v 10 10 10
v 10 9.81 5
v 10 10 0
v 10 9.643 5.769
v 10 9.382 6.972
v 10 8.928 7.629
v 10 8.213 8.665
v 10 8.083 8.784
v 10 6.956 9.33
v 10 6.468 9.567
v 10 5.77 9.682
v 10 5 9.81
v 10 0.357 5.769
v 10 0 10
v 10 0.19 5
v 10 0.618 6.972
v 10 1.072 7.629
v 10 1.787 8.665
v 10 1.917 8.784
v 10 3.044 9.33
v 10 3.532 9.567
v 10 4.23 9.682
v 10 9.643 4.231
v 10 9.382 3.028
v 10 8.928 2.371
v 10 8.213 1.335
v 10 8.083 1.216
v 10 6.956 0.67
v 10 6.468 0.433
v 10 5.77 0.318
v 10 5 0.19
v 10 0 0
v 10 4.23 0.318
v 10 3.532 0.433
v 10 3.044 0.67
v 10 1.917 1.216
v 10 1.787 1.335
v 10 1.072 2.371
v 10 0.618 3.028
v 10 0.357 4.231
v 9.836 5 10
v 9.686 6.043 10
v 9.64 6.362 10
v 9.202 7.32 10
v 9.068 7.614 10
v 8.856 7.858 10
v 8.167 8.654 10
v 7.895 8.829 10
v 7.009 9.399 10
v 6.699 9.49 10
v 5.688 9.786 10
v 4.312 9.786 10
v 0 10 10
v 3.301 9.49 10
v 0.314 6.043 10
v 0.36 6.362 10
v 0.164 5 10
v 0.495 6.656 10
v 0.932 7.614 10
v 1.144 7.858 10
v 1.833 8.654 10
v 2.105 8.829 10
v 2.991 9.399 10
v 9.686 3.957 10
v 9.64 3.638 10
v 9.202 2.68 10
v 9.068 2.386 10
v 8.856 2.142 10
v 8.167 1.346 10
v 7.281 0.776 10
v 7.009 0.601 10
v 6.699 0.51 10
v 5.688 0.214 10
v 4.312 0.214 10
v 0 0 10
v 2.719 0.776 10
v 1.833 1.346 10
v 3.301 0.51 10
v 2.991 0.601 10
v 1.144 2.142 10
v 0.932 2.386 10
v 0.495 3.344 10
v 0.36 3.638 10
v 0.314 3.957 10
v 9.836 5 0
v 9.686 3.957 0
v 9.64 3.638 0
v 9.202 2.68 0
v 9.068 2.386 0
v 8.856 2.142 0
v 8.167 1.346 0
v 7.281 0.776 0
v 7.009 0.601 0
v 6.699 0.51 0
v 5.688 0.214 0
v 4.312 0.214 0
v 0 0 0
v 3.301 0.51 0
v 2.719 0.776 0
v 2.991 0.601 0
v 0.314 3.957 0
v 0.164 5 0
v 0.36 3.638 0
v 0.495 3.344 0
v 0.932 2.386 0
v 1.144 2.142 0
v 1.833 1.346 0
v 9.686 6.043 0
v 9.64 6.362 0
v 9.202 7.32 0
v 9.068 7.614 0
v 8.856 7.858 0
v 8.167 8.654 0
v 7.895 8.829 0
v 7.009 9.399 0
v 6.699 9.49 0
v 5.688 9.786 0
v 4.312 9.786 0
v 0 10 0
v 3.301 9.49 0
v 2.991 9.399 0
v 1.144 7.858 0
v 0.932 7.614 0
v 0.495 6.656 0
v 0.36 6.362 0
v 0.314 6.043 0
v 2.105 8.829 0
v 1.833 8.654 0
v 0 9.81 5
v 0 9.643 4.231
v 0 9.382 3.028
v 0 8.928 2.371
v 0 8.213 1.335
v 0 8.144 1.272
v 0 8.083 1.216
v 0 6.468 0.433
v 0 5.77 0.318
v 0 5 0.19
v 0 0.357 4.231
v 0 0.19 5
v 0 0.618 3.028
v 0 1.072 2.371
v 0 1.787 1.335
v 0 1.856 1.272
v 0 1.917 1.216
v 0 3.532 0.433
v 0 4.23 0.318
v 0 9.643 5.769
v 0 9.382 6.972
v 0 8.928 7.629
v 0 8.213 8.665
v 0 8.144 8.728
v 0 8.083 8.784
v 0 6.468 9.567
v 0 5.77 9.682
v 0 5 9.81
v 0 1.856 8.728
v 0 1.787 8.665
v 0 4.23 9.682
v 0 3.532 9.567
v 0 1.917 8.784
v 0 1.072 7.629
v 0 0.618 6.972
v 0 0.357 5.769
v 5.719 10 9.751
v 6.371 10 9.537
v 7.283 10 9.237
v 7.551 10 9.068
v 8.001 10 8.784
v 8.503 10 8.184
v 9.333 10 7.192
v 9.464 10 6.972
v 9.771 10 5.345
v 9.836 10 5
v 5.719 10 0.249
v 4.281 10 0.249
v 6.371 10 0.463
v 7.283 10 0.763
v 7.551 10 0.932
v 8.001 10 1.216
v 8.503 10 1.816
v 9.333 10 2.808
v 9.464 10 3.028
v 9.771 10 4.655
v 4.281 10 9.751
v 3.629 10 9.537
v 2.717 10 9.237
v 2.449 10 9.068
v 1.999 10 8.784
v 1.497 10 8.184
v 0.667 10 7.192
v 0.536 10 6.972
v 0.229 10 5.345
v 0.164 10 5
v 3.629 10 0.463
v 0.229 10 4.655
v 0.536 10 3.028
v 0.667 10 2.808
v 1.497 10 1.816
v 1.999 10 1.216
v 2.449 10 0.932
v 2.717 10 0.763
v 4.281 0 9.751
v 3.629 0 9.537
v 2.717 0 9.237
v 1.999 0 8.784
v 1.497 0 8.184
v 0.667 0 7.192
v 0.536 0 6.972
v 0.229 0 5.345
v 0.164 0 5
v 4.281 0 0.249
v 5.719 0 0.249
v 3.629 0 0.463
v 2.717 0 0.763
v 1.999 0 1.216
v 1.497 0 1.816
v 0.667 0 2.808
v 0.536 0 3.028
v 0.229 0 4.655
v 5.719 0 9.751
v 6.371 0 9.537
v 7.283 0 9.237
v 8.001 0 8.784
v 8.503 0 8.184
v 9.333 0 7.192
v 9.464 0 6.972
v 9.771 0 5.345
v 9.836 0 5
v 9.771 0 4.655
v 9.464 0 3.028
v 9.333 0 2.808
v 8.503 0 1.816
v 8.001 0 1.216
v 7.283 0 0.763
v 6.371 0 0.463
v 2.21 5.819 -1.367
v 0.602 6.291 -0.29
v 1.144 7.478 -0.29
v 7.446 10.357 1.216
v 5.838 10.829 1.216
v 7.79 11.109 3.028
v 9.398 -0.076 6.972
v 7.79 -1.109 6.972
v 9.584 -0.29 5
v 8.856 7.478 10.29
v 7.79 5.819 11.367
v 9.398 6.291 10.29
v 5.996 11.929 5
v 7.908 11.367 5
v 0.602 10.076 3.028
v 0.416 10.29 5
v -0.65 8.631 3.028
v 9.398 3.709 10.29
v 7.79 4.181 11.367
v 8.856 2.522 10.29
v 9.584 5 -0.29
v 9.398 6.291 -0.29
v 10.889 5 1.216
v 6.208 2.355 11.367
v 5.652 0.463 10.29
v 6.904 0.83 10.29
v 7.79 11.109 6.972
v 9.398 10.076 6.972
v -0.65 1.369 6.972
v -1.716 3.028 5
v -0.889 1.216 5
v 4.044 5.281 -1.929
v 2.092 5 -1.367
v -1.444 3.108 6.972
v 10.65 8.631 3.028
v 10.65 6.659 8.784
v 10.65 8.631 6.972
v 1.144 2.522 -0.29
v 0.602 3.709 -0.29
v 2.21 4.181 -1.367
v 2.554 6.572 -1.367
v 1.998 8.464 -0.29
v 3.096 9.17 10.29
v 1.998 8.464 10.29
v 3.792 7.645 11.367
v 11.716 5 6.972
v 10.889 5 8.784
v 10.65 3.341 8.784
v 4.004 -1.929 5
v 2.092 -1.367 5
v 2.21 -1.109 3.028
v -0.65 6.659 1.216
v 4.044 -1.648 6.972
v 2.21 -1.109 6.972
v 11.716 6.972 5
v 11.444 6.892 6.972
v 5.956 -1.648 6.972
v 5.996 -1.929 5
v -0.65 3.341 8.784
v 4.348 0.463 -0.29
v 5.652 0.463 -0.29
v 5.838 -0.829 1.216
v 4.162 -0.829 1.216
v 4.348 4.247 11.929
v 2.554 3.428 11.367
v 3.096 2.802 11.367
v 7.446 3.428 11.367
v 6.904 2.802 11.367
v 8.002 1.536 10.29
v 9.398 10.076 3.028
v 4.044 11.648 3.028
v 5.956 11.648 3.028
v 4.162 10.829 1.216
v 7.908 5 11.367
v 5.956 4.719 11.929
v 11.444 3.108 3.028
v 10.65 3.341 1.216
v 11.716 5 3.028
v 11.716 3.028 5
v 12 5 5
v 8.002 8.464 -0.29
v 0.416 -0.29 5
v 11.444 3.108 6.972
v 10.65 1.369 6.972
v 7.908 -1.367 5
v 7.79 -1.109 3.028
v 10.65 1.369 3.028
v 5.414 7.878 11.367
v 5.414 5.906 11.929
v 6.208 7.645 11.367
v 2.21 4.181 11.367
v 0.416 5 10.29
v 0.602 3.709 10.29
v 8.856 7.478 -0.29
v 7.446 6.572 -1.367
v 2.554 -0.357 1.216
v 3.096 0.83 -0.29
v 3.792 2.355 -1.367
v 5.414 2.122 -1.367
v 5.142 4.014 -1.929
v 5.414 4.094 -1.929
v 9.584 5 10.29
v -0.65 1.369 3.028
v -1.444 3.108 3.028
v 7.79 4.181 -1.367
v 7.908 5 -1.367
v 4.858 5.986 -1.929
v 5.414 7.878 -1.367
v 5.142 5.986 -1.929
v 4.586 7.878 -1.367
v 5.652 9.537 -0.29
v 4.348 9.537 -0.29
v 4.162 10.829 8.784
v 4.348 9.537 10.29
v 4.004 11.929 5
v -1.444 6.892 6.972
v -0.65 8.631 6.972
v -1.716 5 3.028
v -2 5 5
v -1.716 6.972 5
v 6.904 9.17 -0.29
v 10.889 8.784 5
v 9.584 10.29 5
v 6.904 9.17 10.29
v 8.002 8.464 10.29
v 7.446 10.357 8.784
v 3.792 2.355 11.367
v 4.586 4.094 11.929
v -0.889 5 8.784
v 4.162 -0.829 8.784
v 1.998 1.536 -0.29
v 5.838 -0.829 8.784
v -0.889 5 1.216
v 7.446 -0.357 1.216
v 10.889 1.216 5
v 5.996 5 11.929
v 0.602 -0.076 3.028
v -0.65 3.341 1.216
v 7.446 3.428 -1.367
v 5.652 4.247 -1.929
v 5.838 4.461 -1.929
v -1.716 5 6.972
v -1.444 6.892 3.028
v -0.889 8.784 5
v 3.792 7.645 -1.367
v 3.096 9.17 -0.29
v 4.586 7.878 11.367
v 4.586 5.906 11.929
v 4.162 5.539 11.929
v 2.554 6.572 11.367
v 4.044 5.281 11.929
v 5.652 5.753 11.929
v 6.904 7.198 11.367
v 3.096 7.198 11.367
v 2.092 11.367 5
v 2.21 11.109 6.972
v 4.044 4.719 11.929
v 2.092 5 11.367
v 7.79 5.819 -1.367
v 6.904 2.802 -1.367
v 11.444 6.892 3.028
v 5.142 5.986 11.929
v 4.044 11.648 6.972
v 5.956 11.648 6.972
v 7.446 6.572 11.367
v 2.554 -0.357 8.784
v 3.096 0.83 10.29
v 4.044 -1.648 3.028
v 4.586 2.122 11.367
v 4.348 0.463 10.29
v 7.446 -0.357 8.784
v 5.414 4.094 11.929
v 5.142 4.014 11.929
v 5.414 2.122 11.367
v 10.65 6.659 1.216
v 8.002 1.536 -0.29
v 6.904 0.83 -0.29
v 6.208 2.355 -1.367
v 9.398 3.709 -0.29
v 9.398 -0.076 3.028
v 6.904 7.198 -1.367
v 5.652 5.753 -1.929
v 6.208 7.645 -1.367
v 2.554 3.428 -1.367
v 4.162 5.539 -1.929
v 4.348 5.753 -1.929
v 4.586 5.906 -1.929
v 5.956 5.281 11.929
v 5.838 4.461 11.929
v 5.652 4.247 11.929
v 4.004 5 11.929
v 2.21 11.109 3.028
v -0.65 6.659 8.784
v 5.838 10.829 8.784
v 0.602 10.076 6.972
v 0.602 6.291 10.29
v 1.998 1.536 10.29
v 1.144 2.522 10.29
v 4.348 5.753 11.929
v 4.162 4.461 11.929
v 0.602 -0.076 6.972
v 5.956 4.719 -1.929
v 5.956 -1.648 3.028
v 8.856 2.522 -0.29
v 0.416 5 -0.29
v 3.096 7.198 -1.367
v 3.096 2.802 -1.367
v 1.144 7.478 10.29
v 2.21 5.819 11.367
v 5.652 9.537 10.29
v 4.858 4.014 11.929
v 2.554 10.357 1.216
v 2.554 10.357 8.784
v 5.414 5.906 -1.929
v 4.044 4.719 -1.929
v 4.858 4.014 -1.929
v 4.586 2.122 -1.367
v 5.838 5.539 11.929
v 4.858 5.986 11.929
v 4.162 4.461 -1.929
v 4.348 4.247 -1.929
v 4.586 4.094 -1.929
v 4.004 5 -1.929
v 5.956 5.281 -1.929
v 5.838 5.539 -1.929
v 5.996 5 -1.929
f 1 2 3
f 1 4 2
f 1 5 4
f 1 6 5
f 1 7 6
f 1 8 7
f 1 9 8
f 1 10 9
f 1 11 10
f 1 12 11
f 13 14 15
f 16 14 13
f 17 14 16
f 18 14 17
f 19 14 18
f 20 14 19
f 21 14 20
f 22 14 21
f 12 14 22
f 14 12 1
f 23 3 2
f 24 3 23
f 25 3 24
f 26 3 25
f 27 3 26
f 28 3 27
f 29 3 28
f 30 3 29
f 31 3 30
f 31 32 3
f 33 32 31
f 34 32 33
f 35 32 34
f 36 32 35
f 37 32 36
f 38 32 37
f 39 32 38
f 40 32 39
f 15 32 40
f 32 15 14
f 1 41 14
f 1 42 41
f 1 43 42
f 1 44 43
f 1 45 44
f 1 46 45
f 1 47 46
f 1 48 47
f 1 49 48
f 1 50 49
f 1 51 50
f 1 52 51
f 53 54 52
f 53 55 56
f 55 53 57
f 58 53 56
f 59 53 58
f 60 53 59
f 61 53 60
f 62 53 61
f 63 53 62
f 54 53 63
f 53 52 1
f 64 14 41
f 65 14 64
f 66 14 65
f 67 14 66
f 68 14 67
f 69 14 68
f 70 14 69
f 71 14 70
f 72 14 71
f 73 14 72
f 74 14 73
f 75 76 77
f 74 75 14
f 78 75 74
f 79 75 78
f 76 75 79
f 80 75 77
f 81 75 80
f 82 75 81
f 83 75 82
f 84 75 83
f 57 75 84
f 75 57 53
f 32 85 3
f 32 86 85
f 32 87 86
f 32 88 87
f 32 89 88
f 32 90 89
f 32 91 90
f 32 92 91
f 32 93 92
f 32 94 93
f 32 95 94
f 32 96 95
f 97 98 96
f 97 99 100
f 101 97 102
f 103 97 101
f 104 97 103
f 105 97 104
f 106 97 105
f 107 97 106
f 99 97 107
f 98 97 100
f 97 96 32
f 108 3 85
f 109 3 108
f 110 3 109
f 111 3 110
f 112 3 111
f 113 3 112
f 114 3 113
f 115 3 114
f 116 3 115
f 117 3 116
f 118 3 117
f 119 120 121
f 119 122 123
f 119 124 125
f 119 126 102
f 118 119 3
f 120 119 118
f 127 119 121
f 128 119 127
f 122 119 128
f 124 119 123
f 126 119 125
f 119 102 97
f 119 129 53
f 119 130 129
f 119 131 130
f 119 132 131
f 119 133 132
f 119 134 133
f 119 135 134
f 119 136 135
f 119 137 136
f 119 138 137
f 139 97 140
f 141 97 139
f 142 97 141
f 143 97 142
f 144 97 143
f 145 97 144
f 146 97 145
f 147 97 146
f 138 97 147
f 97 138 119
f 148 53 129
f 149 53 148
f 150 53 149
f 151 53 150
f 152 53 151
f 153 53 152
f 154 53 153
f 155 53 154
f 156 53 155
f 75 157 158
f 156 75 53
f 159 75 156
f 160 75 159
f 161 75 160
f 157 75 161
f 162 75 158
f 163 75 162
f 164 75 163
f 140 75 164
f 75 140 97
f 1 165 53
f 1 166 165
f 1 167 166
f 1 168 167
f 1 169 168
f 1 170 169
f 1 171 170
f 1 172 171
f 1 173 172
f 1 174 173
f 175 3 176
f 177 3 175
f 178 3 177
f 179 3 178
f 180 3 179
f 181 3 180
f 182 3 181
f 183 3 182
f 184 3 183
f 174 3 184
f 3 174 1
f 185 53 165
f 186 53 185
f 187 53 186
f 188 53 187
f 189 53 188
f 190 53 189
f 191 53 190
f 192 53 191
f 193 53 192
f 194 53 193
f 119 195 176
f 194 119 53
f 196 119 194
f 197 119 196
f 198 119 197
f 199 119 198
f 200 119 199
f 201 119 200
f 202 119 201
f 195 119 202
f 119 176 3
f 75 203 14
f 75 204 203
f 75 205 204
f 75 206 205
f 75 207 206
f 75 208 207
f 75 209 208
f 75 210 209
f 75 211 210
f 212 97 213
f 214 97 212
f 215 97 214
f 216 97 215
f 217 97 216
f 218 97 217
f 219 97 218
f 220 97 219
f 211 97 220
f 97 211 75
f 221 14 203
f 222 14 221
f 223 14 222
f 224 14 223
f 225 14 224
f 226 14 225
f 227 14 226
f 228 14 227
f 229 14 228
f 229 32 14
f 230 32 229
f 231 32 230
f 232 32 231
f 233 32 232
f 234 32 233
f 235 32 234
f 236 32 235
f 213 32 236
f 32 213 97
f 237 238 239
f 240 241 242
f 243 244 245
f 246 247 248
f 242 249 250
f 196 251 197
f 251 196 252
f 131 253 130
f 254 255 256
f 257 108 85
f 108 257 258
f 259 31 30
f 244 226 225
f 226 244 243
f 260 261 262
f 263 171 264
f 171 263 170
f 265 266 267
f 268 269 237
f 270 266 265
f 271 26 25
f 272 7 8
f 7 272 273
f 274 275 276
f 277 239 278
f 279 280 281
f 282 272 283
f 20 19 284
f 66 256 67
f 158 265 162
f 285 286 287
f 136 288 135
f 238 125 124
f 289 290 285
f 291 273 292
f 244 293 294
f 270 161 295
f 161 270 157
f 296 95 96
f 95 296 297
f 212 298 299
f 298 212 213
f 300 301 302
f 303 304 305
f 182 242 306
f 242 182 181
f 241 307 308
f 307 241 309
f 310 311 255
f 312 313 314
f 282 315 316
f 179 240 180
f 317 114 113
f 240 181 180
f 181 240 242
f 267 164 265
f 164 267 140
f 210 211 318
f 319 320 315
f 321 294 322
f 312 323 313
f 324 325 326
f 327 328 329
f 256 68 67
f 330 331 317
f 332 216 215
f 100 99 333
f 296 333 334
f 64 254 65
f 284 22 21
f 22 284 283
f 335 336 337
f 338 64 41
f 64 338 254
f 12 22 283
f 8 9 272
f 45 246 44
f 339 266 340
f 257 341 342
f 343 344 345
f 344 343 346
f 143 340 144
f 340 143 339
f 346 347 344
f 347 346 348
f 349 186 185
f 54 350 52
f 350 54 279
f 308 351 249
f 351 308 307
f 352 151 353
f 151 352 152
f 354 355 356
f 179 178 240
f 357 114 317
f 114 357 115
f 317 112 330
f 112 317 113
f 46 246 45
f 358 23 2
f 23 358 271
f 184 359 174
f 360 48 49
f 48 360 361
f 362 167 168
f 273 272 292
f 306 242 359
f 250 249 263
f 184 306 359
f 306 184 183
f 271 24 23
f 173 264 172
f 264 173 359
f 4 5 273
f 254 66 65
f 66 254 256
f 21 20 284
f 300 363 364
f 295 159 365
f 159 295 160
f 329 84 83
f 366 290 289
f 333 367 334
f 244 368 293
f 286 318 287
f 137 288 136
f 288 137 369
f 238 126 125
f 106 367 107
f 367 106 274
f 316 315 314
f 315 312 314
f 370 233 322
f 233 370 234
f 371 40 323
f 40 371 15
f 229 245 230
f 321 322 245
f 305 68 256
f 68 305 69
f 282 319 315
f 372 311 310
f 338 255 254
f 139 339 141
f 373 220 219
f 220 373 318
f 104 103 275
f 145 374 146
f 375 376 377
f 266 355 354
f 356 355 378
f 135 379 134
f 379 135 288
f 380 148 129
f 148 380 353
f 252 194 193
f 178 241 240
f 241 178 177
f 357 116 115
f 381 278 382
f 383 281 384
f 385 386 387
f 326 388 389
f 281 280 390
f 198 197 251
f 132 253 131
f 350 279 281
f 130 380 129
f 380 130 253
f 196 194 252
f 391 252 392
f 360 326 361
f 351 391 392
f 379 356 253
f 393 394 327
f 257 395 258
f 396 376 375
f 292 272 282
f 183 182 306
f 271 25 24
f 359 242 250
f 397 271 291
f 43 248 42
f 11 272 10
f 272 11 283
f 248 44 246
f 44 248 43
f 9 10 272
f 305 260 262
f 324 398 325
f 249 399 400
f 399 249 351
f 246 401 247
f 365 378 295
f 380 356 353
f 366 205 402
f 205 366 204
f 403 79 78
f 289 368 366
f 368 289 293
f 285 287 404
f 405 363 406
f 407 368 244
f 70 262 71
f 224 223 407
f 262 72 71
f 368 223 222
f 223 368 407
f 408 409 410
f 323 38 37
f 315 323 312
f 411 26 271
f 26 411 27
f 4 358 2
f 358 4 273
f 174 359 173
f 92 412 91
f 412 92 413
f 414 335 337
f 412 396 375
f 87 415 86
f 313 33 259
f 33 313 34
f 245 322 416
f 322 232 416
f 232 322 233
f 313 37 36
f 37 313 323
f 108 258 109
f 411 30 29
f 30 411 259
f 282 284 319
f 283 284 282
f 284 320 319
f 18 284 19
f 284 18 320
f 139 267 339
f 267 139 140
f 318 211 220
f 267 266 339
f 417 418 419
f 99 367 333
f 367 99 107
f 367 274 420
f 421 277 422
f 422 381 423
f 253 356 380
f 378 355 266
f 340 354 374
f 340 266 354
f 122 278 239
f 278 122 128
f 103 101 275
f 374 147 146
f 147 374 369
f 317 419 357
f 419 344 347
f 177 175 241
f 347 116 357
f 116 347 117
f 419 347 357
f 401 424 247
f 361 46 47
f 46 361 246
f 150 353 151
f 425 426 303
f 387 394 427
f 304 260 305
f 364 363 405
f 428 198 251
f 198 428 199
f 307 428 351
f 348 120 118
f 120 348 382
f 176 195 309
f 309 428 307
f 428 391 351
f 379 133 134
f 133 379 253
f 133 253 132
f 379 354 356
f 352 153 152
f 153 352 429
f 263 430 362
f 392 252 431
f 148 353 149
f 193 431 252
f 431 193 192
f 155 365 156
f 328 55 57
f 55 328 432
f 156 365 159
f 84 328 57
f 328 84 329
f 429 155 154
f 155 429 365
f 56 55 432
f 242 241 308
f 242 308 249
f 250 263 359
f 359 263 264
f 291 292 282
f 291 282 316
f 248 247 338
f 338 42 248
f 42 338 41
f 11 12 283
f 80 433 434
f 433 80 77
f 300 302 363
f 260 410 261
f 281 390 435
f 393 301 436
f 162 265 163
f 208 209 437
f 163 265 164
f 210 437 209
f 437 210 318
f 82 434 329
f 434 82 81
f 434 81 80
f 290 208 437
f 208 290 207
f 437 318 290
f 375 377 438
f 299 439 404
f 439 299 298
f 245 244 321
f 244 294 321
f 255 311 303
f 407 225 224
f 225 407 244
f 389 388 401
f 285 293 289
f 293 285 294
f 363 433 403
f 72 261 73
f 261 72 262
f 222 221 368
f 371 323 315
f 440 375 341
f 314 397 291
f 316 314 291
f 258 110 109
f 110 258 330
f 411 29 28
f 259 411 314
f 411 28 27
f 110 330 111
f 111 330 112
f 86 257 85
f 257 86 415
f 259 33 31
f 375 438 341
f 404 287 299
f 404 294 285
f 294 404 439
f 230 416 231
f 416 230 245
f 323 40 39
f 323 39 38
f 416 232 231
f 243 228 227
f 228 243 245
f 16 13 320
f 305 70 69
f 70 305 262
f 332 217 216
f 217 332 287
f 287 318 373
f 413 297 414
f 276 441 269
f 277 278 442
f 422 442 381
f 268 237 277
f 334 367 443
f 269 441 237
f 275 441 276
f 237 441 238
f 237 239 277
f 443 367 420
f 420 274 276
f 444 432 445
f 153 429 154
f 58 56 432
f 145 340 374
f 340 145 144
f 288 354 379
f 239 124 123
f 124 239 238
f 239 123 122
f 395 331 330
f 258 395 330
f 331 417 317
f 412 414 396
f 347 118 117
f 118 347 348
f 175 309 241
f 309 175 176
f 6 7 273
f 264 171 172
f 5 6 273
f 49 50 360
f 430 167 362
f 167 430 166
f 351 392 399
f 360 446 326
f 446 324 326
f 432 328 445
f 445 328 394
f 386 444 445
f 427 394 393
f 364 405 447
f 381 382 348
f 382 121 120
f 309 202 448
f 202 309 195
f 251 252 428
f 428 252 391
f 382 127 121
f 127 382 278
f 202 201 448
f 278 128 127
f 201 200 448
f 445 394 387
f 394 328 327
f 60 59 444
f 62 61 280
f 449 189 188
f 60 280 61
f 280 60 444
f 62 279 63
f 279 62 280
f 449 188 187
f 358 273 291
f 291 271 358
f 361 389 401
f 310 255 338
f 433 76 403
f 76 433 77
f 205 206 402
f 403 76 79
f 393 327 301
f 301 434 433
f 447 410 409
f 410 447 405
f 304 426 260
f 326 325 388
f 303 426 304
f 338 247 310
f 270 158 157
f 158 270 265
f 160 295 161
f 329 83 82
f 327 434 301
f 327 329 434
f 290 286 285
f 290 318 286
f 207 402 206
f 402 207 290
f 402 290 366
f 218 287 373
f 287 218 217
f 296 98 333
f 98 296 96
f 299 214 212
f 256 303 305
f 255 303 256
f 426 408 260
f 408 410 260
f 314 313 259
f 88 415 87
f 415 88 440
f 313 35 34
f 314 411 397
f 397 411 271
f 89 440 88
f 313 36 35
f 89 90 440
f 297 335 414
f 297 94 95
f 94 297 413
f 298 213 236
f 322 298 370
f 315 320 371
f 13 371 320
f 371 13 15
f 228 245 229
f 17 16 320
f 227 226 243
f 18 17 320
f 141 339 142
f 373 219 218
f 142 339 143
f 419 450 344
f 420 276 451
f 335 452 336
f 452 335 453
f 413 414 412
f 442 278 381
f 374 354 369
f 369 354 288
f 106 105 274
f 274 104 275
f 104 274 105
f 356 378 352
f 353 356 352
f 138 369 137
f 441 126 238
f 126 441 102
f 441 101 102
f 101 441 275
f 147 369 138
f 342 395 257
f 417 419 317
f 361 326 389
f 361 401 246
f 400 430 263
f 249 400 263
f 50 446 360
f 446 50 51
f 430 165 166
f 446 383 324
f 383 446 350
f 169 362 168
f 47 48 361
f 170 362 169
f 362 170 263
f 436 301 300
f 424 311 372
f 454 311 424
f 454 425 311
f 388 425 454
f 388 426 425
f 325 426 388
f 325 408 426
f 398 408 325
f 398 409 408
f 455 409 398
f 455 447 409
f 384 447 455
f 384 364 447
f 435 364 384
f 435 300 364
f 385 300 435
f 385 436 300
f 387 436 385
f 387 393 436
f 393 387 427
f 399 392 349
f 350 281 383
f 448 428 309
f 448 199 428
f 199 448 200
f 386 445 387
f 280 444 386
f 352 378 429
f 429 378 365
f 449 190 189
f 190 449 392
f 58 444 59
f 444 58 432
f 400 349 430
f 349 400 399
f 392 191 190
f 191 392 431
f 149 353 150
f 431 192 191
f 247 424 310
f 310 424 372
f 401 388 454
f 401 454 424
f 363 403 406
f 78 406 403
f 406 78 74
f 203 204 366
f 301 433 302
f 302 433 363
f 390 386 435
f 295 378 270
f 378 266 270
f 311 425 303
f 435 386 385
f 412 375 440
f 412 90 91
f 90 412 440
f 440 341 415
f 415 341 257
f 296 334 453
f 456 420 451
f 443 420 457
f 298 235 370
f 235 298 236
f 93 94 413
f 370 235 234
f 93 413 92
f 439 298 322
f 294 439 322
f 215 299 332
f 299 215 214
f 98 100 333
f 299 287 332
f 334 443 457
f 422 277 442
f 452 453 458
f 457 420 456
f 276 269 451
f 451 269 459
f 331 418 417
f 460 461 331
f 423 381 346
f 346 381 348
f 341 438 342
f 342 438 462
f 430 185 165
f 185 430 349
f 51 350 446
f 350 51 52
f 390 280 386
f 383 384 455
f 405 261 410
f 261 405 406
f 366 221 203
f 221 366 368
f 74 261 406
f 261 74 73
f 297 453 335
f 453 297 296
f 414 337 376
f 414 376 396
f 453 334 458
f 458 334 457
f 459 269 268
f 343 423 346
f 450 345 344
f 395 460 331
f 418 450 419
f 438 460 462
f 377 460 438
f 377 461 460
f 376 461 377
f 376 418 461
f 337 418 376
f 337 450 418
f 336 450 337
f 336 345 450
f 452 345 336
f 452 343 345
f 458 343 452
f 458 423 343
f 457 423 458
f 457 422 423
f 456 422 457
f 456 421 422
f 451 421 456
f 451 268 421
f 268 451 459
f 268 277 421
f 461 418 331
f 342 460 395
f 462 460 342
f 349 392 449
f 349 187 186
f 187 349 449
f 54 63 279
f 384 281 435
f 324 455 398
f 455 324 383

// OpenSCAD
// Generated by scadwright. Do not hand-edit —
// edit the Python source and regenerate.

union() {
    cube([10, 10, 10], center=false);

    translate([5, 5, 5]) {
        sphere(r=7);
    }
}
